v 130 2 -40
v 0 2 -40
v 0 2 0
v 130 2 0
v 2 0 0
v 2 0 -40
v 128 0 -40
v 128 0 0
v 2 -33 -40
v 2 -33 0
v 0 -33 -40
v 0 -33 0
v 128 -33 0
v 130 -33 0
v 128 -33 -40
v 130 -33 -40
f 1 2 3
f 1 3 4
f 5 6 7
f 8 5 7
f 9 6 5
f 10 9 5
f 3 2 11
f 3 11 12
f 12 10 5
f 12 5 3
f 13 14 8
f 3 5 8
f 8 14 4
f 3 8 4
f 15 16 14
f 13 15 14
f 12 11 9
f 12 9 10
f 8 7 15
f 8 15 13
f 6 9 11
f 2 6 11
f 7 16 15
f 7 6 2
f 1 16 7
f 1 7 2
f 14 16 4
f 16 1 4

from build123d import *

# Parameters (mm, degrees)
SKETCH1_W           = 130
SKETCH1_H           = 40
BOSS_EXTRUDE1_DEPTH = 2
SKETCH2_W           = 40
SKETCH2_H           = 35
BOSS_EXTRUDE2_DEPTH = 2


with BuildPart() as part:
    # Sketch1 → Boss-Extrude1 (new body)
    with BuildSketch(Plane(origin=(0, 0, 0), x_dir=(1, 0, 0), z_dir=(0, 1, 0))):
        with Locations((65, 20)):
            Rectangle(SKETCH1_W, SKETCH1_H)
    extrude(amount=BOSS_EXTRUDE1_DEPTH)

    # Sketch2 → Boss-Extrude2 (add)
    with BuildSketch(Plane.ZY):
        with Locations((-20, -15.5)):
            Rectangle(SKETCH2_W, SKETCH2_H)
    boss_extrude2 = extrude(amount=-BOSS_EXTRUDE2_DEPTH)

    # Mirror1: Boss-Extrude2 across plane
    add(boss_extrude2.mirror(Plane(origin=(65, 0, 0), x_dir=(0, 0, 1), z_dir=(1, 0, 0))))


solid = part.part
